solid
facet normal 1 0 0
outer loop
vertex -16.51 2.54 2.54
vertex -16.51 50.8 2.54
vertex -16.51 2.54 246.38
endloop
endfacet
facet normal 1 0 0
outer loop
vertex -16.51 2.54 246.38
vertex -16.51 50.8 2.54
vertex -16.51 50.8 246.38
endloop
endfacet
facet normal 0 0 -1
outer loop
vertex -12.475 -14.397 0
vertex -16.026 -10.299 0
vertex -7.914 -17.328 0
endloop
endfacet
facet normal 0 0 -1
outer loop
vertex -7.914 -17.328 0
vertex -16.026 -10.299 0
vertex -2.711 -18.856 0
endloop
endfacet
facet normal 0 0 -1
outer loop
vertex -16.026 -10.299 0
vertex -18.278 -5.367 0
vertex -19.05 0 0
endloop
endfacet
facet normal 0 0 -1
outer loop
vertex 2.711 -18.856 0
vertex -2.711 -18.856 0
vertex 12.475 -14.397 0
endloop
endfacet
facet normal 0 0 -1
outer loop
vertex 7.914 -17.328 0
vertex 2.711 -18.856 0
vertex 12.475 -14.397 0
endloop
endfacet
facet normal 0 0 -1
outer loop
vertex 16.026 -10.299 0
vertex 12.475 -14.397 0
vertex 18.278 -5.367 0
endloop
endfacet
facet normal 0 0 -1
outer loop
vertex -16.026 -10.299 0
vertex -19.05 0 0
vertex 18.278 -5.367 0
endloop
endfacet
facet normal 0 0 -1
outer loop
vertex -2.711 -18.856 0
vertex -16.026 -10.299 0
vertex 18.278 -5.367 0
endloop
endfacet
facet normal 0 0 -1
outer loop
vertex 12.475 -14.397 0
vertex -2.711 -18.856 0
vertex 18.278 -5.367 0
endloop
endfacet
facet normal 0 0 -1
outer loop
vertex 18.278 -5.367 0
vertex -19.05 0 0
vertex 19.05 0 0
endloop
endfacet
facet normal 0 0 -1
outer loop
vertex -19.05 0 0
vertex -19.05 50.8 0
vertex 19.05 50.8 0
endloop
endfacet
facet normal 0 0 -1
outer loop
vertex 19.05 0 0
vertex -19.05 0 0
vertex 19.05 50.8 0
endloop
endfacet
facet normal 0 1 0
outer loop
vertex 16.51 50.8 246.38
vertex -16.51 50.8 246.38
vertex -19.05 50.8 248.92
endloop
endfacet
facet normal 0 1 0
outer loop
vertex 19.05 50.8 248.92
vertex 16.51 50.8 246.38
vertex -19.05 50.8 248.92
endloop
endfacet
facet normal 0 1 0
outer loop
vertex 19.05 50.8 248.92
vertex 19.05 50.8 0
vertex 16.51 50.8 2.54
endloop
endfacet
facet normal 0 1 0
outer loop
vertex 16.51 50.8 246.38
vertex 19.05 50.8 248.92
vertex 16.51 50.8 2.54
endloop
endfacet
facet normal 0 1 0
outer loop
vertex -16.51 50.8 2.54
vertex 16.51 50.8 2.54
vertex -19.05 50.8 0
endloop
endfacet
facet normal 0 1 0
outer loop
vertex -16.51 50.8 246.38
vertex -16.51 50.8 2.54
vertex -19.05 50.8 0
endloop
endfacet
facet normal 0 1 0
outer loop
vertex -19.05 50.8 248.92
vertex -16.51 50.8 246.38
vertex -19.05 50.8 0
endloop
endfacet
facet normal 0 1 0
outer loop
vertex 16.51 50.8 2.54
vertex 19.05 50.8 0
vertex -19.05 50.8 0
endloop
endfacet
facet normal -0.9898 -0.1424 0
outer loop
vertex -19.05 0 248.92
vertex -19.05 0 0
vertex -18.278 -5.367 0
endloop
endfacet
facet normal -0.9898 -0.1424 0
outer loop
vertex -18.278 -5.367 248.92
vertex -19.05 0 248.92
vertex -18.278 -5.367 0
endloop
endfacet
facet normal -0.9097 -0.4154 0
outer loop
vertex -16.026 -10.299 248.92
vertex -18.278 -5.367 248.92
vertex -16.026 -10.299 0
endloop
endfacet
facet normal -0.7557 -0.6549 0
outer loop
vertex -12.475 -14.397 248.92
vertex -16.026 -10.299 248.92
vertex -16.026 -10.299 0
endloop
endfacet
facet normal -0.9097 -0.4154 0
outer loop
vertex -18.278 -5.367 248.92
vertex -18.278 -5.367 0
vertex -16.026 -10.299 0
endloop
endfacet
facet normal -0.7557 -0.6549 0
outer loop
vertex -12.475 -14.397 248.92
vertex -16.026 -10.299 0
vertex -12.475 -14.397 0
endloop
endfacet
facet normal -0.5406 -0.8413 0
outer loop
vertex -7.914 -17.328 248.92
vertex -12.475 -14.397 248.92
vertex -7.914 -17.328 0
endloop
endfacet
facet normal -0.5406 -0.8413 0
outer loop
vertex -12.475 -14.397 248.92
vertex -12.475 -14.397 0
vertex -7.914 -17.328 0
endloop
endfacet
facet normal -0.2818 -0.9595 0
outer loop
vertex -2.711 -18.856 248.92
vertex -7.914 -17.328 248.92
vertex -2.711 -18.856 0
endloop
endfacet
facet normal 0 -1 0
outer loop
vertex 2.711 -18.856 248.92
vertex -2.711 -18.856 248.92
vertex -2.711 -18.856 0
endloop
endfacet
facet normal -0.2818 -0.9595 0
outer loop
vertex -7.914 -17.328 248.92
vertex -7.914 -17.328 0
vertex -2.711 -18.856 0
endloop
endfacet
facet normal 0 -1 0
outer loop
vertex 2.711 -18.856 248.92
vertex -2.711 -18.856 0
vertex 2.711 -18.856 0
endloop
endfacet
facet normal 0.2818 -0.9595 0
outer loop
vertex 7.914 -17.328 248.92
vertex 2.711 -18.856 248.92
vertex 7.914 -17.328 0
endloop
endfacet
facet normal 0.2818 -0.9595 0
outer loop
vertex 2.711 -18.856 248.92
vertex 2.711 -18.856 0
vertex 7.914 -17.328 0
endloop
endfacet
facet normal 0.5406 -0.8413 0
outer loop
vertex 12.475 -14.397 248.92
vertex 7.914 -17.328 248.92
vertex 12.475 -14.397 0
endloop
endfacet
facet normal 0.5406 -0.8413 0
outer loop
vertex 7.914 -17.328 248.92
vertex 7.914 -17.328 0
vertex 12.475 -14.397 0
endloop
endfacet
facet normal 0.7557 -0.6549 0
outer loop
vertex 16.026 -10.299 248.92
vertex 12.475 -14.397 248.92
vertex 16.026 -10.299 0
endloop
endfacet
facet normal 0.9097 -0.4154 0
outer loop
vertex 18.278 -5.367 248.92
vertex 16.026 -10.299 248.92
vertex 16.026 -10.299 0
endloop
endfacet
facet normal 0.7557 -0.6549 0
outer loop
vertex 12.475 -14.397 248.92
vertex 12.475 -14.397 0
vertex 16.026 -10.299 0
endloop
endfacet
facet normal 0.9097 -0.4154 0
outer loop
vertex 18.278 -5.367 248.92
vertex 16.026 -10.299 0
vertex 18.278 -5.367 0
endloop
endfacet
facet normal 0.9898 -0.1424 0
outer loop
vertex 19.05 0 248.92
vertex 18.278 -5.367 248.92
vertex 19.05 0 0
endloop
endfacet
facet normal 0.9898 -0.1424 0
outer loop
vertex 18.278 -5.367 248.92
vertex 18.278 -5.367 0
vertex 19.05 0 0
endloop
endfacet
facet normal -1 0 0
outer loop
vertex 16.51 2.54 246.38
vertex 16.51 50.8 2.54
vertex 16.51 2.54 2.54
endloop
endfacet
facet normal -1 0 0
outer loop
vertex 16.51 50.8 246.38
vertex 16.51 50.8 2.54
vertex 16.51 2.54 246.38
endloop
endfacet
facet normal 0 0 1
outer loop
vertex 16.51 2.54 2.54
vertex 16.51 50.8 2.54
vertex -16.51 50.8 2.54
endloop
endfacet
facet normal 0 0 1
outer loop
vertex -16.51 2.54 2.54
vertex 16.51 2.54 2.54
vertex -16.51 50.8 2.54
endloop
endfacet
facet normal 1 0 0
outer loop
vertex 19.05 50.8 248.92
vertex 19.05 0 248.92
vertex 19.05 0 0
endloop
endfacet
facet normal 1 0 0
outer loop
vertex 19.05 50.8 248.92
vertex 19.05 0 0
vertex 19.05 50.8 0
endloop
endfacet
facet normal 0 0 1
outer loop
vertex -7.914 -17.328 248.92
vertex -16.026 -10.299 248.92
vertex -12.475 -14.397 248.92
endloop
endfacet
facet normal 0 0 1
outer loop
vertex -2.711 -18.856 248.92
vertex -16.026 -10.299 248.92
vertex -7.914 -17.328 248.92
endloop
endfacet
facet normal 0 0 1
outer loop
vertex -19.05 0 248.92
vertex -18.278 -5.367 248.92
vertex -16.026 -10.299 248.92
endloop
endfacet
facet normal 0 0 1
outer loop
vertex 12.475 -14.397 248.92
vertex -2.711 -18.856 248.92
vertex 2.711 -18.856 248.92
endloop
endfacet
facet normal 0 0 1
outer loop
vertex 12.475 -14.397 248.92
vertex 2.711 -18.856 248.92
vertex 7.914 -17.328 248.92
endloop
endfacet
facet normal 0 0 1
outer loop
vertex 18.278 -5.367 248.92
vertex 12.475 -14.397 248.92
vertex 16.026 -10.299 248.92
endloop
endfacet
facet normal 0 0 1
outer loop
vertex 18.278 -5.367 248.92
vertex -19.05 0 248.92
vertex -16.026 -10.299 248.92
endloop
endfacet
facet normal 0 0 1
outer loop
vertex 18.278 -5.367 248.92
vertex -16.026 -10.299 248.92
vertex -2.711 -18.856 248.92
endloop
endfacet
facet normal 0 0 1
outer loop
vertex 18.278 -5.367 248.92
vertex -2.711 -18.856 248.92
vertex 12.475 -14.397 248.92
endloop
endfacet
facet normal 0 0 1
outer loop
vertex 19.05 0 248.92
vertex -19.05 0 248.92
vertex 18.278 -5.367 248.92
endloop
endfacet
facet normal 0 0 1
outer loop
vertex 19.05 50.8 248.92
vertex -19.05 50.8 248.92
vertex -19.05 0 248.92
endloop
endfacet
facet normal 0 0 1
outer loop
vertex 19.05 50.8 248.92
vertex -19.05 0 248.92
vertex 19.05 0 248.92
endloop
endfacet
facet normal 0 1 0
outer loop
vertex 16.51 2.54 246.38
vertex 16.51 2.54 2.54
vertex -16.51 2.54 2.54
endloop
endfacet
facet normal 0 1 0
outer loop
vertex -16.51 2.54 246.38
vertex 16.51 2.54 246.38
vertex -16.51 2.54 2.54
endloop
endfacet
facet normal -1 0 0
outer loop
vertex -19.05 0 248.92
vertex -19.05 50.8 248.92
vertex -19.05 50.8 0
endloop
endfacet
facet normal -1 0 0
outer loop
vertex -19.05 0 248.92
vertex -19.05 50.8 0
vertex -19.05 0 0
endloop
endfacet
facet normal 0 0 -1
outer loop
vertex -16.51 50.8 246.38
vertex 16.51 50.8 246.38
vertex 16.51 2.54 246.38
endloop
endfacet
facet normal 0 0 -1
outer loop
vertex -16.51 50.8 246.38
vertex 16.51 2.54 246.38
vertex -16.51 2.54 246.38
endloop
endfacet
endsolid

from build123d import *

# Parameters (mm, degrees)
F1_DEPTH = 248.92
F2_W     = 33.02
F2_H     = 243.84
F3_DEPTH = 48.26


with BuildPart() as f1:
    # F0 (on Top) → F1 (new body)
    with BuildSketch(Plane.XY):
        with BuildLine():
            ThreePointArc((-19.05, 0), (0, 19.05), (19.05, 0))
            Line((19.05, 0), (19.05, 50.8))
            Line((19.05, 50.8), (-19.05, 50.8))
            Line((-19.05, 50.8), (-19.05, 0))
        make_face()
        with BuildLine():
            Line((-19.05, 0), (19.05, 0))
            ThreePointArc((19.05, 0), (0, 19.05), (-19.05, 0))
        make_face()
        with BuildLine():
            ThreePointArc((-19.05, 0), (0, -19.05), (19.05, 0))
            Line((19.05, 0), (-19.05, 0))
        make_face()
    extrude(amount=F1_DEPTH)

    # F2 (on face) → F3 (cut)
    with BuildSketch(Plane(origin=(0, 50.8, 0), x_dir=(-1, 0, 0), z_dir=(0, 1, 0))):
        with Locations((0, 124.46)):
            Rectangle(F2_W, F2_H)
    extrude(amount=-F3_DEPTH, mode=Mode.SUBTRACT)


solid = f1.part
